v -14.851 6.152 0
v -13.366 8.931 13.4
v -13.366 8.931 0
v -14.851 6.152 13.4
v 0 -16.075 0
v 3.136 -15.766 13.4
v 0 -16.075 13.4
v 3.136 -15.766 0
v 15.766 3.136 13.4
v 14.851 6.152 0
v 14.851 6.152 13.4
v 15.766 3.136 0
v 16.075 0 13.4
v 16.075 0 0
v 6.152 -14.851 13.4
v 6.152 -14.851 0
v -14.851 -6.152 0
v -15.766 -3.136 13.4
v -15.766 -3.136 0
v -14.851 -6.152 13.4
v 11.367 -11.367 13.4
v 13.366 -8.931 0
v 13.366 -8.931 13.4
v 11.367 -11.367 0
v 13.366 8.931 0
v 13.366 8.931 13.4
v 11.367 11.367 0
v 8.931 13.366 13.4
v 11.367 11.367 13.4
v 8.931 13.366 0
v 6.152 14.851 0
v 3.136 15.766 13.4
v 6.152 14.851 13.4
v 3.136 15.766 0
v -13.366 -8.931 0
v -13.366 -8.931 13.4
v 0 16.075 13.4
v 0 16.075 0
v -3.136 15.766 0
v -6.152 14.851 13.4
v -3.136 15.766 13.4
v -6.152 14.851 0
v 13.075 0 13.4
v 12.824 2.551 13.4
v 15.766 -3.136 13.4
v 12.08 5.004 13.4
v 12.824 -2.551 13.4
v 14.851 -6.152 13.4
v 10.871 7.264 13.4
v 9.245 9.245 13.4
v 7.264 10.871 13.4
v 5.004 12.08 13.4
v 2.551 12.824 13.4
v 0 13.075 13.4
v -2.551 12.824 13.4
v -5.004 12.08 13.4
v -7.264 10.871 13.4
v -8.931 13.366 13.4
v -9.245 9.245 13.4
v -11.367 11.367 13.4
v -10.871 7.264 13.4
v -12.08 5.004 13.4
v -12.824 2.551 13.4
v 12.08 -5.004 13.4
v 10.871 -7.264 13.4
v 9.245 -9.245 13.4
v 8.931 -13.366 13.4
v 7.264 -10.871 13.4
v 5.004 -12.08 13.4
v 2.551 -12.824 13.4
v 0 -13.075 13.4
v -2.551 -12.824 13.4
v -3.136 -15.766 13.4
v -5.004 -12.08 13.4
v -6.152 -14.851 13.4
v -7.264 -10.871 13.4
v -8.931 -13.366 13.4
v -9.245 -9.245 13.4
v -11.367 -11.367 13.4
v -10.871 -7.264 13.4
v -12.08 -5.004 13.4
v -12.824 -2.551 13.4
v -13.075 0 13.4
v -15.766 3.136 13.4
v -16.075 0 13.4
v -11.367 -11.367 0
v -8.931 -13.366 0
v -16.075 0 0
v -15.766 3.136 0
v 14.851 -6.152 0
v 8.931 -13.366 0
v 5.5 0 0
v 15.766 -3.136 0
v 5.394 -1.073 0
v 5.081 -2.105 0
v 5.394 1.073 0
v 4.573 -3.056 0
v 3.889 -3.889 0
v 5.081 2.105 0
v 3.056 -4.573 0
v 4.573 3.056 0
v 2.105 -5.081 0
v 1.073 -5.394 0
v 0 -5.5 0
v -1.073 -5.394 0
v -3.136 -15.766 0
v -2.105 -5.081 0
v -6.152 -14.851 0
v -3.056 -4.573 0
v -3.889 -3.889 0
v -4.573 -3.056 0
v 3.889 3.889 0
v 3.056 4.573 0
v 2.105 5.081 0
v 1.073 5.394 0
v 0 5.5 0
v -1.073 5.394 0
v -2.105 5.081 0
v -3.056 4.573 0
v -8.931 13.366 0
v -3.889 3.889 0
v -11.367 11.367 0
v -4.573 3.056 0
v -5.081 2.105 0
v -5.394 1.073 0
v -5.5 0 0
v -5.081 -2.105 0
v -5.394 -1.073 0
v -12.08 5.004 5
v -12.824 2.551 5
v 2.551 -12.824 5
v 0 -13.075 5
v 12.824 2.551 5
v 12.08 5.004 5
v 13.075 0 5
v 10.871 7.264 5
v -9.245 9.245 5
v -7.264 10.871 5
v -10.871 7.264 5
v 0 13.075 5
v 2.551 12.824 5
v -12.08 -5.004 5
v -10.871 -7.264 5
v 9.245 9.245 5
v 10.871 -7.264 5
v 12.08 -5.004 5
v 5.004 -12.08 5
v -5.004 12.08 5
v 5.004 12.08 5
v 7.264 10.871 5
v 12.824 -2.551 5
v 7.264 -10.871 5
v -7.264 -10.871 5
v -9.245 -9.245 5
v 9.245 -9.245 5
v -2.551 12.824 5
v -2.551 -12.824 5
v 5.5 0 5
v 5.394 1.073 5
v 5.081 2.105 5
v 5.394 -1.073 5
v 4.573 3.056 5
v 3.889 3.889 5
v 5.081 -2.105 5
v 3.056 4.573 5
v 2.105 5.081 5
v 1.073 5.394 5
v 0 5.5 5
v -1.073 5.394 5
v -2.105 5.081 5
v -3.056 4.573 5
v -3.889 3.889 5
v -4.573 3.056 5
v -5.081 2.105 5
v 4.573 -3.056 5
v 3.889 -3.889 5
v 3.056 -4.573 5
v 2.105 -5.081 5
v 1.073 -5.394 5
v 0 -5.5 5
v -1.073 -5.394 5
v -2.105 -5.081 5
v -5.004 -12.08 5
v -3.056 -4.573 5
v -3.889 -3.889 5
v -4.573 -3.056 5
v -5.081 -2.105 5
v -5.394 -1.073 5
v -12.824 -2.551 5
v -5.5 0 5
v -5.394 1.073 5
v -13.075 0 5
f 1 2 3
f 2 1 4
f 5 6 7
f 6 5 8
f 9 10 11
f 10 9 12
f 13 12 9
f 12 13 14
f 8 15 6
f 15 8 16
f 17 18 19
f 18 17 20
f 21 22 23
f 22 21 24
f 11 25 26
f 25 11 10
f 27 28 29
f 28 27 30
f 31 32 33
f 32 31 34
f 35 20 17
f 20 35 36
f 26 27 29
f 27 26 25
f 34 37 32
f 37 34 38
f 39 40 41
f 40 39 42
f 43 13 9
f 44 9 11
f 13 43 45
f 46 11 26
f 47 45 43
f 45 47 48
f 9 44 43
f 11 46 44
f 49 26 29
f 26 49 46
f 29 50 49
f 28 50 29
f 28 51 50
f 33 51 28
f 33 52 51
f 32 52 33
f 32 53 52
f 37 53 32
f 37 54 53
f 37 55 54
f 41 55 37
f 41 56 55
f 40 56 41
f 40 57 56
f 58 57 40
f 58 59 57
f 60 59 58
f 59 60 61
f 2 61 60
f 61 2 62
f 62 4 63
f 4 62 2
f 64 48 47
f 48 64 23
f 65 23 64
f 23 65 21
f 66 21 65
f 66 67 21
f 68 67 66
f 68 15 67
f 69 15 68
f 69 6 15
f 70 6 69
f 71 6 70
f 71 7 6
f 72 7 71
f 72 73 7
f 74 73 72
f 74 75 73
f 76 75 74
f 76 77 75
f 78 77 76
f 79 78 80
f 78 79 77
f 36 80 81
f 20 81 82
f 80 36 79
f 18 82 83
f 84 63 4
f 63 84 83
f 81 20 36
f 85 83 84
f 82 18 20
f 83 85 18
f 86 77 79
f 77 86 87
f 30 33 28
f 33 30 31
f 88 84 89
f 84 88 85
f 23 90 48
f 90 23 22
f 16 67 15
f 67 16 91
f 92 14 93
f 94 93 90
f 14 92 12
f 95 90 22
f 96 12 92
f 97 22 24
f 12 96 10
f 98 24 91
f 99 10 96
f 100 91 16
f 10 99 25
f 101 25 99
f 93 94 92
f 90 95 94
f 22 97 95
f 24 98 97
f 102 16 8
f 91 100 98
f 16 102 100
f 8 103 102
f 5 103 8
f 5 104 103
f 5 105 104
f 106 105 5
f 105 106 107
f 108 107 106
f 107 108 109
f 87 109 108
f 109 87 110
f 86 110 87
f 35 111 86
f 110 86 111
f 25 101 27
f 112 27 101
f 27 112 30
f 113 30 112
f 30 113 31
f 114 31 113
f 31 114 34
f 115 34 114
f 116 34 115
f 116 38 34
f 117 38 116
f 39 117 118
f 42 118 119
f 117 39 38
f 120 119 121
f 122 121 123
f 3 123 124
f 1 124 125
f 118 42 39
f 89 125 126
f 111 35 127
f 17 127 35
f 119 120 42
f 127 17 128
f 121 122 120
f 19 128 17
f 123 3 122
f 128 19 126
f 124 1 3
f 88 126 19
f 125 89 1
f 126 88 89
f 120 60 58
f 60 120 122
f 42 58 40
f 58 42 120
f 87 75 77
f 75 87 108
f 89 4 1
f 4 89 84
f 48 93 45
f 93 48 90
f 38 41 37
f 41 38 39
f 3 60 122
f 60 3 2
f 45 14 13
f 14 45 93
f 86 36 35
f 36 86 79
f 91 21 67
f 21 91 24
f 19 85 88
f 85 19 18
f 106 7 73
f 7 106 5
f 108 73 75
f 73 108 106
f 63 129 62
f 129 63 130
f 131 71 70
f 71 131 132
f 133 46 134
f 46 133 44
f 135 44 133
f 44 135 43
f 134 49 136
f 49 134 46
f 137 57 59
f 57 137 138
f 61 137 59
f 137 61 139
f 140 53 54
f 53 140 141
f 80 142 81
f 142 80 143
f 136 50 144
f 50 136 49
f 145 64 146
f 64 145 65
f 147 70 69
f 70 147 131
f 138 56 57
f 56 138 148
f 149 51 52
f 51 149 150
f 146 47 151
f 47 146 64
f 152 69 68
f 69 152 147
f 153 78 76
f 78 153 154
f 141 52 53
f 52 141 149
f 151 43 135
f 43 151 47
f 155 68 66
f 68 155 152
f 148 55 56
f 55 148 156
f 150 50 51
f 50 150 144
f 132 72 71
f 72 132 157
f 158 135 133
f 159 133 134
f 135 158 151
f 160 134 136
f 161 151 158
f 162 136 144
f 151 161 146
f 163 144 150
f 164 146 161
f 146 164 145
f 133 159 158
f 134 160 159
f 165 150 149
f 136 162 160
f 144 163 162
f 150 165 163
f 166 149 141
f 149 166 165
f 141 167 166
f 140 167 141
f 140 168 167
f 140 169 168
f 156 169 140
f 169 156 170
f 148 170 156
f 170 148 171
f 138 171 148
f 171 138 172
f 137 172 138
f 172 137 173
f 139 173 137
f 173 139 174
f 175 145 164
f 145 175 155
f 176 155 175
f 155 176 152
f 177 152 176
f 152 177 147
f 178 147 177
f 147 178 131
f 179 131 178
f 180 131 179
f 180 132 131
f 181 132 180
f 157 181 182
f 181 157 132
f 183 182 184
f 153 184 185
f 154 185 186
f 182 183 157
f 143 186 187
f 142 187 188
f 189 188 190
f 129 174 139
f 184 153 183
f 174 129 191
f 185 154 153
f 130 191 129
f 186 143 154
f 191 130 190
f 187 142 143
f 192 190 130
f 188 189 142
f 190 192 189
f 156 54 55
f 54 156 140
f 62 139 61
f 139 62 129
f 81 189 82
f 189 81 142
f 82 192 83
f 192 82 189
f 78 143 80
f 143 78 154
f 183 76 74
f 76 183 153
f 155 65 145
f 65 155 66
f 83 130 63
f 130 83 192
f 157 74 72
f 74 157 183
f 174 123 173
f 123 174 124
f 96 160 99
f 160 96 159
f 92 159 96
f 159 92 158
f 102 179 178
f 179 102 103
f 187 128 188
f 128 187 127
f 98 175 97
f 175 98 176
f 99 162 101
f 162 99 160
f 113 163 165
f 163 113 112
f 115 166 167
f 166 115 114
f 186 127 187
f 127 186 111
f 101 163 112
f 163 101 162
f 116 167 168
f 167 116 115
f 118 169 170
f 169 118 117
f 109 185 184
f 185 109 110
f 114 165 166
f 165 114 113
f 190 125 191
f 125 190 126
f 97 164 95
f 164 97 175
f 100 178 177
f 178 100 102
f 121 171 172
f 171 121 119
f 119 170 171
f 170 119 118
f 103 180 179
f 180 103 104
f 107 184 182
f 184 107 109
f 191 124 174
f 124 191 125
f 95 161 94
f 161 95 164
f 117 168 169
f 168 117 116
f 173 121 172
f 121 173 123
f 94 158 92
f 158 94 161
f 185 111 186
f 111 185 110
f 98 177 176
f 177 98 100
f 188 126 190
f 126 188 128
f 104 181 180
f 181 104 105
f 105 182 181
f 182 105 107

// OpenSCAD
$fn = 32;

// ----------------------------------------------------------------------
// Bearing housing: seat for 6000 (26 x 8 mm), 32.15 mm body
// ----------------------------------------------------------------------

// --- parameters (mm) ---
housing_d = 32.15;        // housing outside diameter
housing_h = 13.4;         // overall housing height
wall_t = 3;               // wall thickness
seat_d = 26.15;           // 6000 seat, 0.15 mm clearance
seat_h = 8.4;             // pocket depth
shoulder = 5;             // shoulder under the bearing
pass_d = 11;              // shaft passage

module body() {
  cylinder(h = housing_h, d = housing_d);
}

difference() {
  union() {
    body();
  }
  translate([0, 0, housing_h - seat_h]) cylinder(h = seat_h + 1, d = seat_d);
  translate([0, 0, -1]) cylinder(h = housing_h - seat_h + 1, d = pass_d);
}
